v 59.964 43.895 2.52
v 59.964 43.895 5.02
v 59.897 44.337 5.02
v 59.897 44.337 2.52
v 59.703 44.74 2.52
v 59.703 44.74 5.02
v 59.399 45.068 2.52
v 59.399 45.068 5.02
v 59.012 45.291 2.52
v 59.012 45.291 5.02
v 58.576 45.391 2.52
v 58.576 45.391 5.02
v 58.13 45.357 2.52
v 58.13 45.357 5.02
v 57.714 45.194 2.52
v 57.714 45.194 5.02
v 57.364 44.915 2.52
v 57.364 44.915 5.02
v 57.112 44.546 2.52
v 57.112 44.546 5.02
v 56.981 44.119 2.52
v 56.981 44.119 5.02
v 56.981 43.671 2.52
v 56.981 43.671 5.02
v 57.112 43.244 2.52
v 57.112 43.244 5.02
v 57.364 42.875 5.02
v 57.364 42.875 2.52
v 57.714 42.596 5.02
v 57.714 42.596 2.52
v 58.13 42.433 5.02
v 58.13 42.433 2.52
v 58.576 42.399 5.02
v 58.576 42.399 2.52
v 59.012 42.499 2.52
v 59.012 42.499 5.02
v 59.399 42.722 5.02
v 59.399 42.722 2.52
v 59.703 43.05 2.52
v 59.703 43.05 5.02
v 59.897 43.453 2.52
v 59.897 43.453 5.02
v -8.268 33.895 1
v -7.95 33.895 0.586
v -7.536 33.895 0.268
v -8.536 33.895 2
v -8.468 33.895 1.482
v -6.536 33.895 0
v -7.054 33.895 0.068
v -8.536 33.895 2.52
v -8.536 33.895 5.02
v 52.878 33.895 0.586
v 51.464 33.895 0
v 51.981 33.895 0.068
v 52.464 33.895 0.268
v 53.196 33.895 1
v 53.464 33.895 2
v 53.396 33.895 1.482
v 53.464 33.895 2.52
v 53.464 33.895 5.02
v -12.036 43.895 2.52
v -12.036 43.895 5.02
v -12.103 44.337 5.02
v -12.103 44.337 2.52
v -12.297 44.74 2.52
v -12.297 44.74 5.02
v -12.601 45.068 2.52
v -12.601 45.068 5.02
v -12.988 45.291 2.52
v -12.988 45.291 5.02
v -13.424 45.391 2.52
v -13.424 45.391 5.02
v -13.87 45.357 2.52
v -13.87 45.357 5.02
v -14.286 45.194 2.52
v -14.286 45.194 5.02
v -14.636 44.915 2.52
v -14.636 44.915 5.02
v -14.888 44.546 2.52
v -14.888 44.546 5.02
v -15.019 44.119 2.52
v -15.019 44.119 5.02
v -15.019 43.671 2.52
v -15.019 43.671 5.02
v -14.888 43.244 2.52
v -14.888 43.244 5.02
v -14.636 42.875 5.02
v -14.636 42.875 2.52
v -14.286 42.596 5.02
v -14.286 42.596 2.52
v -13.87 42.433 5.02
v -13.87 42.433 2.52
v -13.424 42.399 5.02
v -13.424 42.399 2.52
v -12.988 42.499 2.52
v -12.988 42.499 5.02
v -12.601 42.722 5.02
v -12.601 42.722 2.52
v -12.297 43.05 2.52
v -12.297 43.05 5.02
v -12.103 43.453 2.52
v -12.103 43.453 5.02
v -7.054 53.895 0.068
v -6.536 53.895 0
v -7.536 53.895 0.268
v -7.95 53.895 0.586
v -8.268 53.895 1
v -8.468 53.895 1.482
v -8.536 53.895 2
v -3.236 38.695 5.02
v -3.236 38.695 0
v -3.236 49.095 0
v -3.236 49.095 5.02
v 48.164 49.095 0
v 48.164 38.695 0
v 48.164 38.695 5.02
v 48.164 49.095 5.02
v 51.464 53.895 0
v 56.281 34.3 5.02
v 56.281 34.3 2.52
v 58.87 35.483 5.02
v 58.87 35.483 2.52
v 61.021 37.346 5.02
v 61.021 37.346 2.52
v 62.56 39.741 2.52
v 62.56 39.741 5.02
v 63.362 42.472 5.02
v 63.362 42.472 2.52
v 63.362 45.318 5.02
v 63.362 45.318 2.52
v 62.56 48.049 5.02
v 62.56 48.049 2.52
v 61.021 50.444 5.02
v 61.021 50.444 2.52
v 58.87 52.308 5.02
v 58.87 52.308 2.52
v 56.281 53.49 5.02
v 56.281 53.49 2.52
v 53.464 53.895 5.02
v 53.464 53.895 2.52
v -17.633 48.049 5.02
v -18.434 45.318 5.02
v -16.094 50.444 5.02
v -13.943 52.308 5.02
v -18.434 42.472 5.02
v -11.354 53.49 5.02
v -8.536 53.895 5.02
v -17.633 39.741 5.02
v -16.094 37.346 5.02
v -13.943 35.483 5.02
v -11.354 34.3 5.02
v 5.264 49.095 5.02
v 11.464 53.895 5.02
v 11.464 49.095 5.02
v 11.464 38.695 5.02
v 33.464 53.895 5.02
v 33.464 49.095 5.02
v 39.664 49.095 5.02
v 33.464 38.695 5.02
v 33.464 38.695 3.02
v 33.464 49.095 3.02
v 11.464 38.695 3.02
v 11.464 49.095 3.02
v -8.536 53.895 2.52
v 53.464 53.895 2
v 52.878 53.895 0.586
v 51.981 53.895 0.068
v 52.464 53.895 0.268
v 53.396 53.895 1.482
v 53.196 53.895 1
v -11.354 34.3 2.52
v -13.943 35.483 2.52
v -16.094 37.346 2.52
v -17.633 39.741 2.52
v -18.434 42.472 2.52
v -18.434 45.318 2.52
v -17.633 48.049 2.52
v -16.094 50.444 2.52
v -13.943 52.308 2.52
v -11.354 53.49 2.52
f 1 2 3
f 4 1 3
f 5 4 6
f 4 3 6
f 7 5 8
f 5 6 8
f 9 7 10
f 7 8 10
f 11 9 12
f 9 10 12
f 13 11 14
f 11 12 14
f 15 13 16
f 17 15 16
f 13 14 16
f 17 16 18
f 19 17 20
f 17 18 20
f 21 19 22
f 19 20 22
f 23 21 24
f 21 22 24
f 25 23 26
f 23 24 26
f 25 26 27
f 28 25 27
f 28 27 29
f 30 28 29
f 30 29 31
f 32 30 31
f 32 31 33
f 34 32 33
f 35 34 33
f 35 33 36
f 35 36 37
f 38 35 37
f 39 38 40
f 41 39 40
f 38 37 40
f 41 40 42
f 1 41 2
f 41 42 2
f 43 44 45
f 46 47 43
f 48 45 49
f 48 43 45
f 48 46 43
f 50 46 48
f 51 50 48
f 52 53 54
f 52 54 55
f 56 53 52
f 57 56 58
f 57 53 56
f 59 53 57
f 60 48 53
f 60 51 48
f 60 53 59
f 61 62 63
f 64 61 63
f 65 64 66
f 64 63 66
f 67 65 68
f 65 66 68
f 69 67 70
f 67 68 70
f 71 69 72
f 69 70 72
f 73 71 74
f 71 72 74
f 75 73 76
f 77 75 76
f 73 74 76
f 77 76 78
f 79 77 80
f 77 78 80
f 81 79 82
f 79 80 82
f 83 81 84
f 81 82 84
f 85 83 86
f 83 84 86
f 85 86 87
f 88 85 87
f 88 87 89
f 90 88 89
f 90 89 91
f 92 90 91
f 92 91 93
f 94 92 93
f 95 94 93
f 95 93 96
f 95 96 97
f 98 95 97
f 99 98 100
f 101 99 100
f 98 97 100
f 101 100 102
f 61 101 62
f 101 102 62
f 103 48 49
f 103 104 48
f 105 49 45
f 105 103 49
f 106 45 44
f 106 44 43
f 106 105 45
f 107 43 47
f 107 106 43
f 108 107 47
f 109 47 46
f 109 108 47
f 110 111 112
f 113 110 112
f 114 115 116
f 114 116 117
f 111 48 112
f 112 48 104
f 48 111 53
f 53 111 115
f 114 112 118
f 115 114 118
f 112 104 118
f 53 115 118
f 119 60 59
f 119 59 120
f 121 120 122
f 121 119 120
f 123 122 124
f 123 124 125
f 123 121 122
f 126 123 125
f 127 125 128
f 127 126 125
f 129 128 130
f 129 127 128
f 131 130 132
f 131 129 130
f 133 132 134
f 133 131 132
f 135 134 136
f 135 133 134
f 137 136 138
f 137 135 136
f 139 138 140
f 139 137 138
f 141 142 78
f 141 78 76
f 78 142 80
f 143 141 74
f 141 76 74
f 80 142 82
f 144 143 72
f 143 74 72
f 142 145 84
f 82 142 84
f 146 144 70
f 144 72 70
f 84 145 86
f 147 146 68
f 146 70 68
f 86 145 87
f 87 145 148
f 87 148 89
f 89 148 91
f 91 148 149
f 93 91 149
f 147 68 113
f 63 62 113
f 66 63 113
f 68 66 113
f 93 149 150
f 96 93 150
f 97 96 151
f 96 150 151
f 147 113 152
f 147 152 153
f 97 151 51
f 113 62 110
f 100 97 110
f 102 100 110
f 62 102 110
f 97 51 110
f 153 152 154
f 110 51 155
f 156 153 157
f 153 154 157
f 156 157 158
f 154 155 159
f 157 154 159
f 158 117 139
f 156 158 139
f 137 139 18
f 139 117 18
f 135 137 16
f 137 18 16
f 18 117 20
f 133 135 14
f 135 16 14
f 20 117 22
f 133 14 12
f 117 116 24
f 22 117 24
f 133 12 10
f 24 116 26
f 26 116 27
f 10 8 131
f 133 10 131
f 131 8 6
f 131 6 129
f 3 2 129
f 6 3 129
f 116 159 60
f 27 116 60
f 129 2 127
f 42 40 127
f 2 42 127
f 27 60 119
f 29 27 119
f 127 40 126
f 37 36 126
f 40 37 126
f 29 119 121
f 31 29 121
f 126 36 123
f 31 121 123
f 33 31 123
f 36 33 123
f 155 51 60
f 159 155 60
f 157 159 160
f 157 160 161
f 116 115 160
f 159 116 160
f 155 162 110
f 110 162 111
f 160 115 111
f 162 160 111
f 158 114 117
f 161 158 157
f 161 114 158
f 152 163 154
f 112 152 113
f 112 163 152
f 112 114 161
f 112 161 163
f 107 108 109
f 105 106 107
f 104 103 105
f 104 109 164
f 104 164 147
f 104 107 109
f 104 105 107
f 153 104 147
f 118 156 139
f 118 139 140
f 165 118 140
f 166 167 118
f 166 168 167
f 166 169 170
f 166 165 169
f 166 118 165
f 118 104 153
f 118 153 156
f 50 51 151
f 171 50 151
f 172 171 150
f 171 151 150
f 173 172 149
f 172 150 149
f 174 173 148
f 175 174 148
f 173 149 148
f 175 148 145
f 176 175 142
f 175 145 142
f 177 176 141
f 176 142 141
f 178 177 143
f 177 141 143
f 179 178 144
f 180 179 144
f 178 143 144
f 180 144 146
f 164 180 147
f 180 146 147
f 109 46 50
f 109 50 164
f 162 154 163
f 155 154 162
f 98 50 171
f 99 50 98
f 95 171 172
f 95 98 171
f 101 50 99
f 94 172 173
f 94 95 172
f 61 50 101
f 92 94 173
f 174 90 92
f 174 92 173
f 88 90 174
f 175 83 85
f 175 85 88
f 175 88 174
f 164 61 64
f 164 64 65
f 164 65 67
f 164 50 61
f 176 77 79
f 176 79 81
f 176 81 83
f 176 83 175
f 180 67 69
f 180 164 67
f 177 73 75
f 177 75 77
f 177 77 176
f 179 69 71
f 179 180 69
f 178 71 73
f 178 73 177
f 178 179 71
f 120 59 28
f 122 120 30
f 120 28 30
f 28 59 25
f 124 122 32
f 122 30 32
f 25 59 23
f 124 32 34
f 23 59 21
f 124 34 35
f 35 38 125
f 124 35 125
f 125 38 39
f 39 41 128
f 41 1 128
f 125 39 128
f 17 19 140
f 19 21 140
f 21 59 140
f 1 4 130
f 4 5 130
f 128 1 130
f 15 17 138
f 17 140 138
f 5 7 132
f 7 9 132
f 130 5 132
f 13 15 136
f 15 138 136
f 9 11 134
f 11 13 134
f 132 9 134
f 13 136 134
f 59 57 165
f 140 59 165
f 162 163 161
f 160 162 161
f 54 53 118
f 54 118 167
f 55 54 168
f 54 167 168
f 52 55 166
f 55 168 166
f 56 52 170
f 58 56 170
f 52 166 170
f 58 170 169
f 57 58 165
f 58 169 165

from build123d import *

# Parameters (mm, degrees)
SKETCH1_W            = 62
SKETCH1_H            = 20
SKETCH1_W_2          = 51.4
SKETCH1_H_2          = 10.4
BOSS_EXTRUDE2_DEPTH  = 3.02
SKETCH3_W            = 62
SKETCH3_H            = 20
BOSS_EXTRUDE3_DEPTH  = 2
SKETCH5_W            = 8.5
SKETCH5_H            = 10.4
CUT_EXTRUDE1_DEPTH   = 10
SKETCH19_W           = 34.4
SKETCH19_H           = 2.300107623
SKETCH19_H_2         = 2.300107622
CUT_EXTRUDE7_DEPTH   = 4
SKETCH21_W           = 7
SKETCH21_H           = 7.100107623
SKETCH21_H_2         = 5.799784755
SKETCH21_H_3         = 7.100107622
SKETCH21_W_2         = 4
BOSS_EXTRUDE11_DEPTH = 2
SKETCH22_R           = 1.5
BOSS_EXTRUDE12_DEPTH = 2.5
FILLET1_R            = 2
FILLET2_R            = 2
SKETCH25_W           = 57.10557297
SKETCH25_H           = 5.799784755
SKETCH25_W_2         = 34.4
BOSS_EXTRUDE13_DEPTH = 3.8
SKETCH26_W           = 57.10557297
SKETCH26_H           = 5.799784755
CUT_EXTRUDE8_DEPTH   = 3.8
SKETCH27_W           = 34.4
SKETCH27_H           = 3.8
CUT_EXTRUDE9_DEPTH   = 20
SKETCH28_W           = 6.2
SKETCH28_H           = 5.799784755
CUT_EXTRUDE10_DEPTH  = 20


with BuildPart() as part:
    # Sketch1 → Boss-Extrude2 (new body)
    with BuildSketch(Plane.XY):
        with Locations((22.463748762, 43.895041876)):
            Rectangle(SKETCH1_W, SKETCH1_H)
        with Locations((22.463748762, 43.895041876)):
            Rectangle(SKETCH1_W_2, SKETCH1_H_2, mode=Mode.SUBTRACT)
    extrude(amount=BOSS_EXTRUDE2_DEPTH)

    # Sketch3 → Boss-Extrude3 (add)
    with BuildSketch(Plane.XY.offset(3.02)):
        with Locations((22.463748762, 43.895041876)):
            Rectangle(SKETCH3_W, SKETCH3_H)
    extrude(amount=BOSS_EXTRUDE3_DEPTH)

    # Sketch5 → Cut-Extrude1 (cut)
    with BuildSketch(Plane(origin=(0, 0, 3.02), x_dir=(-1, 0, 0), z_dir=(0, 0, -1))):
        with Locations((-1.013748762, 43.895041876)):
            Rectangle(SKETCH5_W, SKETCH5_H)
        with Locations((-43.913748762, 43.895041876)):
            Rectangle(SKETCH5_W, SKETCH5_H)
    extrude(amount=-CUT_EXTRUDE1_DEPTH, mode=Mode.SUBTRACT)

    # Sketch19 → Cut-Extrude7 (cut)
    with BuildSketch(Plane.XY.offset(5.02)):
        with Locations((22.463748762, 47.944988065)):
            Rectangle(SKETCH19_W, SKETCH19_H)
        with Locations((22.463748762, 39.845095687)):
            Rectangle(SKETCH19_W, SKETCH19_H_2)
    extrude(amount=-CUT_EXTRUDE7_DEPTH, mode=Mode.SUBTRACT)


with BuildPart() as cut_extrude7_piece_1:
    # of the separate pieces the step leaves, piece 1, a body of its own (cut_extrude7_pieces)
    add(part.part.solids().sort_by_distance((-8.536251238, 33.895041876, 0))[0])



with BuildPart() as cut_extrude7_piece_2:
    # of the separate pieces the step leaves, piece 2, a body of its own (cut_extrude7_pieces)
    add(part.part.solids().sort_by_distance((5.263748762, 46.794934253, 5.02))[0])


with BuildPart() as cut_extrude7_piece_1_1:
    add(cut_extrude7_piece_1.part)

    add(cut_extrude7_piece_2.part)  # Boss-Extrude11 merges Cut-Extrude7 piece 2
    # Sketch21 → Boss-Extrude11 (add)
    with BuildSketch(Plane.XY.offset(5.02)):
        with Locations((29.963748762, 50.344988065)):
            Rectangle(SKETCH21_W, SKETCH21_H)
        with Locations((29.963748762, 43.895041875)):
            Rectangle(SKETCH21_W, SKETCH21_H_2)
        with Locations((29.963748762, 37.445095687)):
            Rectangle(SKETCH21_W, SKETCH21_H_3)
        with Locations((14.963748762, 37.445095687)):
            Rectangle(SKETCH21_W, SKETCH21_H_3)
        with Locations((14.963748762, 43.895041875)):
            Rectangle(SKETCH21_W, SKETCH21_H_2)
        with Locations((14.963748762, 50.344988065)):
            Rectangle(SKETCH21_W, SKETCH21_H)
        with Locations((24.463748762, 50.344988065)):
            Rectangle(SKETCH21_W_2, SKETCH21_H)
        with Locations((24.463748762, 43.895041875)):
            Rectangle(SKETCH21_W_2, SKETCH21_H_2)
        with Locations((24.463748762, 37.445095687)):
            Rectangle(SKETCH21_W_2, SKETCH21_H_3)
        with Locations((20.463748762, 37.445095687)):
            Rectangle(SKETCH21_W_2, SKETCH21_H_3)
        with Locations((20.463748762, 43.895041875)):
            Rectangle(SKETCH21_W_2, SKETCH21_H_2)
        with Locations((20.463748762, 50.344988065)):
            Rectangle(SKETCH21_W_2, SKETCH21_H)
    extrude(amount=-BOSS_EXTRUDE11_DEPTH)

    # Sketch22 → Boss-Extrude12 (add)
    # profile 1 of 2: a face of its own
    with BuildSketch(Plane.XY.offset(5.02)):
        with BuildLine():
            ThreePointArc((53.463748762, 33.895041876), (63.463748762, 43.895041876), (53.463748762, 53.895041876))
            Line((53.463748762, 53.895041876), (53.463748762, 33.895041876))
        make_face()
        with Locations((58.463748762, 43.895041876)):
            Circle(SKETCH22_R, mode=Mode.SUBTRACT)
    # profile 2 of 2: a face of its own
    with BuildSketch(Plane.XY.offset(5.02)):
        with BuildLine():
            ThreePointArc((-8.536251238, 33.895041876), (-18.536251238, 43.895041876), (-8.536251238, 53.895041876))
            Line((-8.536251238, 53.895041876), (-8.536251238, 33.895041876))
        make_face()
        with Locations((-13.536251238, 43.895041876)):
            Circle(SKETCH22_R, mode=Mode.SUBTRACT)
    extrude(amount=-BOSS_EXTRUDE12_DEPTH)

    # Fillet1
    fillet1_edges = [cut_extrude7_piece_1_1.edges().sort_by_distance(p)[0] for p in [
        (53.463748762, 43.895041876, 0),
    ]]
    fillet(fillet1_edges, radius=FILLET1_R)

    # Fillet2
    fillet2_edges = [cut_extrude7_piece_1_1.edges().sort_by_distance(p)[0] for p in [
        (-8.536251238, 43.895041876, 0),
    ]]
    fillet(fillet2_edges, radius=FILLET2_R)

    # Sketch25 → Boss-Extrude13 (add)
    with BuildSketch(Plane.XY.offset(5.02)):
        with Locations((20.043435204, 67.888102351)):
            Rectangle(SKETCH25_W, SKETCH25_H)
        with Locations((22.463748762, 43.895041875)):
            Rectangle(SKETCH25_W_2, SKETCH25_H)
    extrude(amount=BOSS_EXTRUDE13_DEPTH)


with BuildPart() as boss_extrude13_piece_1:
    # of the separate pieces the step leaves, piece 1, a body of its own (boss_extrude13_pieces)
    add(cut_extrude7_piece_1_1.part.solids().sort_by_distance((-6.536251238, 33.895041876, 0))[0])

    # Sketch27 → Cut-Extrude9 (cut)
    with BuildSketch(Plane.XZ.offset(-40.995149498)):
        with Locations((22.463748762, 6.92)):
            Rectangle(SKETCH27_W, SKETCH27_H)
    extrude(amount=-CUT_EXTRUDE9_DEPTH, mode=Mode.SUBTRACT)

    # Sketch28 → Cut-Extrude10 (cut)
    with BuildSketch(Plane.XY.offset(5.02)):
        with Locations((36.563748762, 43.895041875)):
            Rectangle(SKETCH28_W, SKETCH28_H)
        with Locations((8.363748762, 43.895041875)):
            Rectangle(SKETCH28_W, SKETCH28_H)
    extrude(amount=-CUT_EXTRUDE10_DEPTH, mode=Mode.SUBTRACT)


with BuildPart() as boss_extrude13_piece_2:
    # of the separate pieces the step leaves, piece 2, a body of its own (boss_extrude13_pieces)
    add(cut_extrude7_piece_1_1.part.solids().sort_by_distance((-8.509351281, 70.787994728, 5.02))[0])

    # Sketch26 → Cut-Extrude8 (cut)
    with BuildSketch(Plane(origin=(0, 0, 5.02), x_dir=(-1, 0, 0), z_dir=(0, 0, -1))):
        with Locations((-20.043435204, 67.888102351)):
            Rectangle(SKETCH26_W, SKETCH26_H)
    extrude(amount=-CUT_EXTRUDE8_DEPTH, mode=Mode.SUBTRACT)


solid = boss_extrude13_piece_1.part
